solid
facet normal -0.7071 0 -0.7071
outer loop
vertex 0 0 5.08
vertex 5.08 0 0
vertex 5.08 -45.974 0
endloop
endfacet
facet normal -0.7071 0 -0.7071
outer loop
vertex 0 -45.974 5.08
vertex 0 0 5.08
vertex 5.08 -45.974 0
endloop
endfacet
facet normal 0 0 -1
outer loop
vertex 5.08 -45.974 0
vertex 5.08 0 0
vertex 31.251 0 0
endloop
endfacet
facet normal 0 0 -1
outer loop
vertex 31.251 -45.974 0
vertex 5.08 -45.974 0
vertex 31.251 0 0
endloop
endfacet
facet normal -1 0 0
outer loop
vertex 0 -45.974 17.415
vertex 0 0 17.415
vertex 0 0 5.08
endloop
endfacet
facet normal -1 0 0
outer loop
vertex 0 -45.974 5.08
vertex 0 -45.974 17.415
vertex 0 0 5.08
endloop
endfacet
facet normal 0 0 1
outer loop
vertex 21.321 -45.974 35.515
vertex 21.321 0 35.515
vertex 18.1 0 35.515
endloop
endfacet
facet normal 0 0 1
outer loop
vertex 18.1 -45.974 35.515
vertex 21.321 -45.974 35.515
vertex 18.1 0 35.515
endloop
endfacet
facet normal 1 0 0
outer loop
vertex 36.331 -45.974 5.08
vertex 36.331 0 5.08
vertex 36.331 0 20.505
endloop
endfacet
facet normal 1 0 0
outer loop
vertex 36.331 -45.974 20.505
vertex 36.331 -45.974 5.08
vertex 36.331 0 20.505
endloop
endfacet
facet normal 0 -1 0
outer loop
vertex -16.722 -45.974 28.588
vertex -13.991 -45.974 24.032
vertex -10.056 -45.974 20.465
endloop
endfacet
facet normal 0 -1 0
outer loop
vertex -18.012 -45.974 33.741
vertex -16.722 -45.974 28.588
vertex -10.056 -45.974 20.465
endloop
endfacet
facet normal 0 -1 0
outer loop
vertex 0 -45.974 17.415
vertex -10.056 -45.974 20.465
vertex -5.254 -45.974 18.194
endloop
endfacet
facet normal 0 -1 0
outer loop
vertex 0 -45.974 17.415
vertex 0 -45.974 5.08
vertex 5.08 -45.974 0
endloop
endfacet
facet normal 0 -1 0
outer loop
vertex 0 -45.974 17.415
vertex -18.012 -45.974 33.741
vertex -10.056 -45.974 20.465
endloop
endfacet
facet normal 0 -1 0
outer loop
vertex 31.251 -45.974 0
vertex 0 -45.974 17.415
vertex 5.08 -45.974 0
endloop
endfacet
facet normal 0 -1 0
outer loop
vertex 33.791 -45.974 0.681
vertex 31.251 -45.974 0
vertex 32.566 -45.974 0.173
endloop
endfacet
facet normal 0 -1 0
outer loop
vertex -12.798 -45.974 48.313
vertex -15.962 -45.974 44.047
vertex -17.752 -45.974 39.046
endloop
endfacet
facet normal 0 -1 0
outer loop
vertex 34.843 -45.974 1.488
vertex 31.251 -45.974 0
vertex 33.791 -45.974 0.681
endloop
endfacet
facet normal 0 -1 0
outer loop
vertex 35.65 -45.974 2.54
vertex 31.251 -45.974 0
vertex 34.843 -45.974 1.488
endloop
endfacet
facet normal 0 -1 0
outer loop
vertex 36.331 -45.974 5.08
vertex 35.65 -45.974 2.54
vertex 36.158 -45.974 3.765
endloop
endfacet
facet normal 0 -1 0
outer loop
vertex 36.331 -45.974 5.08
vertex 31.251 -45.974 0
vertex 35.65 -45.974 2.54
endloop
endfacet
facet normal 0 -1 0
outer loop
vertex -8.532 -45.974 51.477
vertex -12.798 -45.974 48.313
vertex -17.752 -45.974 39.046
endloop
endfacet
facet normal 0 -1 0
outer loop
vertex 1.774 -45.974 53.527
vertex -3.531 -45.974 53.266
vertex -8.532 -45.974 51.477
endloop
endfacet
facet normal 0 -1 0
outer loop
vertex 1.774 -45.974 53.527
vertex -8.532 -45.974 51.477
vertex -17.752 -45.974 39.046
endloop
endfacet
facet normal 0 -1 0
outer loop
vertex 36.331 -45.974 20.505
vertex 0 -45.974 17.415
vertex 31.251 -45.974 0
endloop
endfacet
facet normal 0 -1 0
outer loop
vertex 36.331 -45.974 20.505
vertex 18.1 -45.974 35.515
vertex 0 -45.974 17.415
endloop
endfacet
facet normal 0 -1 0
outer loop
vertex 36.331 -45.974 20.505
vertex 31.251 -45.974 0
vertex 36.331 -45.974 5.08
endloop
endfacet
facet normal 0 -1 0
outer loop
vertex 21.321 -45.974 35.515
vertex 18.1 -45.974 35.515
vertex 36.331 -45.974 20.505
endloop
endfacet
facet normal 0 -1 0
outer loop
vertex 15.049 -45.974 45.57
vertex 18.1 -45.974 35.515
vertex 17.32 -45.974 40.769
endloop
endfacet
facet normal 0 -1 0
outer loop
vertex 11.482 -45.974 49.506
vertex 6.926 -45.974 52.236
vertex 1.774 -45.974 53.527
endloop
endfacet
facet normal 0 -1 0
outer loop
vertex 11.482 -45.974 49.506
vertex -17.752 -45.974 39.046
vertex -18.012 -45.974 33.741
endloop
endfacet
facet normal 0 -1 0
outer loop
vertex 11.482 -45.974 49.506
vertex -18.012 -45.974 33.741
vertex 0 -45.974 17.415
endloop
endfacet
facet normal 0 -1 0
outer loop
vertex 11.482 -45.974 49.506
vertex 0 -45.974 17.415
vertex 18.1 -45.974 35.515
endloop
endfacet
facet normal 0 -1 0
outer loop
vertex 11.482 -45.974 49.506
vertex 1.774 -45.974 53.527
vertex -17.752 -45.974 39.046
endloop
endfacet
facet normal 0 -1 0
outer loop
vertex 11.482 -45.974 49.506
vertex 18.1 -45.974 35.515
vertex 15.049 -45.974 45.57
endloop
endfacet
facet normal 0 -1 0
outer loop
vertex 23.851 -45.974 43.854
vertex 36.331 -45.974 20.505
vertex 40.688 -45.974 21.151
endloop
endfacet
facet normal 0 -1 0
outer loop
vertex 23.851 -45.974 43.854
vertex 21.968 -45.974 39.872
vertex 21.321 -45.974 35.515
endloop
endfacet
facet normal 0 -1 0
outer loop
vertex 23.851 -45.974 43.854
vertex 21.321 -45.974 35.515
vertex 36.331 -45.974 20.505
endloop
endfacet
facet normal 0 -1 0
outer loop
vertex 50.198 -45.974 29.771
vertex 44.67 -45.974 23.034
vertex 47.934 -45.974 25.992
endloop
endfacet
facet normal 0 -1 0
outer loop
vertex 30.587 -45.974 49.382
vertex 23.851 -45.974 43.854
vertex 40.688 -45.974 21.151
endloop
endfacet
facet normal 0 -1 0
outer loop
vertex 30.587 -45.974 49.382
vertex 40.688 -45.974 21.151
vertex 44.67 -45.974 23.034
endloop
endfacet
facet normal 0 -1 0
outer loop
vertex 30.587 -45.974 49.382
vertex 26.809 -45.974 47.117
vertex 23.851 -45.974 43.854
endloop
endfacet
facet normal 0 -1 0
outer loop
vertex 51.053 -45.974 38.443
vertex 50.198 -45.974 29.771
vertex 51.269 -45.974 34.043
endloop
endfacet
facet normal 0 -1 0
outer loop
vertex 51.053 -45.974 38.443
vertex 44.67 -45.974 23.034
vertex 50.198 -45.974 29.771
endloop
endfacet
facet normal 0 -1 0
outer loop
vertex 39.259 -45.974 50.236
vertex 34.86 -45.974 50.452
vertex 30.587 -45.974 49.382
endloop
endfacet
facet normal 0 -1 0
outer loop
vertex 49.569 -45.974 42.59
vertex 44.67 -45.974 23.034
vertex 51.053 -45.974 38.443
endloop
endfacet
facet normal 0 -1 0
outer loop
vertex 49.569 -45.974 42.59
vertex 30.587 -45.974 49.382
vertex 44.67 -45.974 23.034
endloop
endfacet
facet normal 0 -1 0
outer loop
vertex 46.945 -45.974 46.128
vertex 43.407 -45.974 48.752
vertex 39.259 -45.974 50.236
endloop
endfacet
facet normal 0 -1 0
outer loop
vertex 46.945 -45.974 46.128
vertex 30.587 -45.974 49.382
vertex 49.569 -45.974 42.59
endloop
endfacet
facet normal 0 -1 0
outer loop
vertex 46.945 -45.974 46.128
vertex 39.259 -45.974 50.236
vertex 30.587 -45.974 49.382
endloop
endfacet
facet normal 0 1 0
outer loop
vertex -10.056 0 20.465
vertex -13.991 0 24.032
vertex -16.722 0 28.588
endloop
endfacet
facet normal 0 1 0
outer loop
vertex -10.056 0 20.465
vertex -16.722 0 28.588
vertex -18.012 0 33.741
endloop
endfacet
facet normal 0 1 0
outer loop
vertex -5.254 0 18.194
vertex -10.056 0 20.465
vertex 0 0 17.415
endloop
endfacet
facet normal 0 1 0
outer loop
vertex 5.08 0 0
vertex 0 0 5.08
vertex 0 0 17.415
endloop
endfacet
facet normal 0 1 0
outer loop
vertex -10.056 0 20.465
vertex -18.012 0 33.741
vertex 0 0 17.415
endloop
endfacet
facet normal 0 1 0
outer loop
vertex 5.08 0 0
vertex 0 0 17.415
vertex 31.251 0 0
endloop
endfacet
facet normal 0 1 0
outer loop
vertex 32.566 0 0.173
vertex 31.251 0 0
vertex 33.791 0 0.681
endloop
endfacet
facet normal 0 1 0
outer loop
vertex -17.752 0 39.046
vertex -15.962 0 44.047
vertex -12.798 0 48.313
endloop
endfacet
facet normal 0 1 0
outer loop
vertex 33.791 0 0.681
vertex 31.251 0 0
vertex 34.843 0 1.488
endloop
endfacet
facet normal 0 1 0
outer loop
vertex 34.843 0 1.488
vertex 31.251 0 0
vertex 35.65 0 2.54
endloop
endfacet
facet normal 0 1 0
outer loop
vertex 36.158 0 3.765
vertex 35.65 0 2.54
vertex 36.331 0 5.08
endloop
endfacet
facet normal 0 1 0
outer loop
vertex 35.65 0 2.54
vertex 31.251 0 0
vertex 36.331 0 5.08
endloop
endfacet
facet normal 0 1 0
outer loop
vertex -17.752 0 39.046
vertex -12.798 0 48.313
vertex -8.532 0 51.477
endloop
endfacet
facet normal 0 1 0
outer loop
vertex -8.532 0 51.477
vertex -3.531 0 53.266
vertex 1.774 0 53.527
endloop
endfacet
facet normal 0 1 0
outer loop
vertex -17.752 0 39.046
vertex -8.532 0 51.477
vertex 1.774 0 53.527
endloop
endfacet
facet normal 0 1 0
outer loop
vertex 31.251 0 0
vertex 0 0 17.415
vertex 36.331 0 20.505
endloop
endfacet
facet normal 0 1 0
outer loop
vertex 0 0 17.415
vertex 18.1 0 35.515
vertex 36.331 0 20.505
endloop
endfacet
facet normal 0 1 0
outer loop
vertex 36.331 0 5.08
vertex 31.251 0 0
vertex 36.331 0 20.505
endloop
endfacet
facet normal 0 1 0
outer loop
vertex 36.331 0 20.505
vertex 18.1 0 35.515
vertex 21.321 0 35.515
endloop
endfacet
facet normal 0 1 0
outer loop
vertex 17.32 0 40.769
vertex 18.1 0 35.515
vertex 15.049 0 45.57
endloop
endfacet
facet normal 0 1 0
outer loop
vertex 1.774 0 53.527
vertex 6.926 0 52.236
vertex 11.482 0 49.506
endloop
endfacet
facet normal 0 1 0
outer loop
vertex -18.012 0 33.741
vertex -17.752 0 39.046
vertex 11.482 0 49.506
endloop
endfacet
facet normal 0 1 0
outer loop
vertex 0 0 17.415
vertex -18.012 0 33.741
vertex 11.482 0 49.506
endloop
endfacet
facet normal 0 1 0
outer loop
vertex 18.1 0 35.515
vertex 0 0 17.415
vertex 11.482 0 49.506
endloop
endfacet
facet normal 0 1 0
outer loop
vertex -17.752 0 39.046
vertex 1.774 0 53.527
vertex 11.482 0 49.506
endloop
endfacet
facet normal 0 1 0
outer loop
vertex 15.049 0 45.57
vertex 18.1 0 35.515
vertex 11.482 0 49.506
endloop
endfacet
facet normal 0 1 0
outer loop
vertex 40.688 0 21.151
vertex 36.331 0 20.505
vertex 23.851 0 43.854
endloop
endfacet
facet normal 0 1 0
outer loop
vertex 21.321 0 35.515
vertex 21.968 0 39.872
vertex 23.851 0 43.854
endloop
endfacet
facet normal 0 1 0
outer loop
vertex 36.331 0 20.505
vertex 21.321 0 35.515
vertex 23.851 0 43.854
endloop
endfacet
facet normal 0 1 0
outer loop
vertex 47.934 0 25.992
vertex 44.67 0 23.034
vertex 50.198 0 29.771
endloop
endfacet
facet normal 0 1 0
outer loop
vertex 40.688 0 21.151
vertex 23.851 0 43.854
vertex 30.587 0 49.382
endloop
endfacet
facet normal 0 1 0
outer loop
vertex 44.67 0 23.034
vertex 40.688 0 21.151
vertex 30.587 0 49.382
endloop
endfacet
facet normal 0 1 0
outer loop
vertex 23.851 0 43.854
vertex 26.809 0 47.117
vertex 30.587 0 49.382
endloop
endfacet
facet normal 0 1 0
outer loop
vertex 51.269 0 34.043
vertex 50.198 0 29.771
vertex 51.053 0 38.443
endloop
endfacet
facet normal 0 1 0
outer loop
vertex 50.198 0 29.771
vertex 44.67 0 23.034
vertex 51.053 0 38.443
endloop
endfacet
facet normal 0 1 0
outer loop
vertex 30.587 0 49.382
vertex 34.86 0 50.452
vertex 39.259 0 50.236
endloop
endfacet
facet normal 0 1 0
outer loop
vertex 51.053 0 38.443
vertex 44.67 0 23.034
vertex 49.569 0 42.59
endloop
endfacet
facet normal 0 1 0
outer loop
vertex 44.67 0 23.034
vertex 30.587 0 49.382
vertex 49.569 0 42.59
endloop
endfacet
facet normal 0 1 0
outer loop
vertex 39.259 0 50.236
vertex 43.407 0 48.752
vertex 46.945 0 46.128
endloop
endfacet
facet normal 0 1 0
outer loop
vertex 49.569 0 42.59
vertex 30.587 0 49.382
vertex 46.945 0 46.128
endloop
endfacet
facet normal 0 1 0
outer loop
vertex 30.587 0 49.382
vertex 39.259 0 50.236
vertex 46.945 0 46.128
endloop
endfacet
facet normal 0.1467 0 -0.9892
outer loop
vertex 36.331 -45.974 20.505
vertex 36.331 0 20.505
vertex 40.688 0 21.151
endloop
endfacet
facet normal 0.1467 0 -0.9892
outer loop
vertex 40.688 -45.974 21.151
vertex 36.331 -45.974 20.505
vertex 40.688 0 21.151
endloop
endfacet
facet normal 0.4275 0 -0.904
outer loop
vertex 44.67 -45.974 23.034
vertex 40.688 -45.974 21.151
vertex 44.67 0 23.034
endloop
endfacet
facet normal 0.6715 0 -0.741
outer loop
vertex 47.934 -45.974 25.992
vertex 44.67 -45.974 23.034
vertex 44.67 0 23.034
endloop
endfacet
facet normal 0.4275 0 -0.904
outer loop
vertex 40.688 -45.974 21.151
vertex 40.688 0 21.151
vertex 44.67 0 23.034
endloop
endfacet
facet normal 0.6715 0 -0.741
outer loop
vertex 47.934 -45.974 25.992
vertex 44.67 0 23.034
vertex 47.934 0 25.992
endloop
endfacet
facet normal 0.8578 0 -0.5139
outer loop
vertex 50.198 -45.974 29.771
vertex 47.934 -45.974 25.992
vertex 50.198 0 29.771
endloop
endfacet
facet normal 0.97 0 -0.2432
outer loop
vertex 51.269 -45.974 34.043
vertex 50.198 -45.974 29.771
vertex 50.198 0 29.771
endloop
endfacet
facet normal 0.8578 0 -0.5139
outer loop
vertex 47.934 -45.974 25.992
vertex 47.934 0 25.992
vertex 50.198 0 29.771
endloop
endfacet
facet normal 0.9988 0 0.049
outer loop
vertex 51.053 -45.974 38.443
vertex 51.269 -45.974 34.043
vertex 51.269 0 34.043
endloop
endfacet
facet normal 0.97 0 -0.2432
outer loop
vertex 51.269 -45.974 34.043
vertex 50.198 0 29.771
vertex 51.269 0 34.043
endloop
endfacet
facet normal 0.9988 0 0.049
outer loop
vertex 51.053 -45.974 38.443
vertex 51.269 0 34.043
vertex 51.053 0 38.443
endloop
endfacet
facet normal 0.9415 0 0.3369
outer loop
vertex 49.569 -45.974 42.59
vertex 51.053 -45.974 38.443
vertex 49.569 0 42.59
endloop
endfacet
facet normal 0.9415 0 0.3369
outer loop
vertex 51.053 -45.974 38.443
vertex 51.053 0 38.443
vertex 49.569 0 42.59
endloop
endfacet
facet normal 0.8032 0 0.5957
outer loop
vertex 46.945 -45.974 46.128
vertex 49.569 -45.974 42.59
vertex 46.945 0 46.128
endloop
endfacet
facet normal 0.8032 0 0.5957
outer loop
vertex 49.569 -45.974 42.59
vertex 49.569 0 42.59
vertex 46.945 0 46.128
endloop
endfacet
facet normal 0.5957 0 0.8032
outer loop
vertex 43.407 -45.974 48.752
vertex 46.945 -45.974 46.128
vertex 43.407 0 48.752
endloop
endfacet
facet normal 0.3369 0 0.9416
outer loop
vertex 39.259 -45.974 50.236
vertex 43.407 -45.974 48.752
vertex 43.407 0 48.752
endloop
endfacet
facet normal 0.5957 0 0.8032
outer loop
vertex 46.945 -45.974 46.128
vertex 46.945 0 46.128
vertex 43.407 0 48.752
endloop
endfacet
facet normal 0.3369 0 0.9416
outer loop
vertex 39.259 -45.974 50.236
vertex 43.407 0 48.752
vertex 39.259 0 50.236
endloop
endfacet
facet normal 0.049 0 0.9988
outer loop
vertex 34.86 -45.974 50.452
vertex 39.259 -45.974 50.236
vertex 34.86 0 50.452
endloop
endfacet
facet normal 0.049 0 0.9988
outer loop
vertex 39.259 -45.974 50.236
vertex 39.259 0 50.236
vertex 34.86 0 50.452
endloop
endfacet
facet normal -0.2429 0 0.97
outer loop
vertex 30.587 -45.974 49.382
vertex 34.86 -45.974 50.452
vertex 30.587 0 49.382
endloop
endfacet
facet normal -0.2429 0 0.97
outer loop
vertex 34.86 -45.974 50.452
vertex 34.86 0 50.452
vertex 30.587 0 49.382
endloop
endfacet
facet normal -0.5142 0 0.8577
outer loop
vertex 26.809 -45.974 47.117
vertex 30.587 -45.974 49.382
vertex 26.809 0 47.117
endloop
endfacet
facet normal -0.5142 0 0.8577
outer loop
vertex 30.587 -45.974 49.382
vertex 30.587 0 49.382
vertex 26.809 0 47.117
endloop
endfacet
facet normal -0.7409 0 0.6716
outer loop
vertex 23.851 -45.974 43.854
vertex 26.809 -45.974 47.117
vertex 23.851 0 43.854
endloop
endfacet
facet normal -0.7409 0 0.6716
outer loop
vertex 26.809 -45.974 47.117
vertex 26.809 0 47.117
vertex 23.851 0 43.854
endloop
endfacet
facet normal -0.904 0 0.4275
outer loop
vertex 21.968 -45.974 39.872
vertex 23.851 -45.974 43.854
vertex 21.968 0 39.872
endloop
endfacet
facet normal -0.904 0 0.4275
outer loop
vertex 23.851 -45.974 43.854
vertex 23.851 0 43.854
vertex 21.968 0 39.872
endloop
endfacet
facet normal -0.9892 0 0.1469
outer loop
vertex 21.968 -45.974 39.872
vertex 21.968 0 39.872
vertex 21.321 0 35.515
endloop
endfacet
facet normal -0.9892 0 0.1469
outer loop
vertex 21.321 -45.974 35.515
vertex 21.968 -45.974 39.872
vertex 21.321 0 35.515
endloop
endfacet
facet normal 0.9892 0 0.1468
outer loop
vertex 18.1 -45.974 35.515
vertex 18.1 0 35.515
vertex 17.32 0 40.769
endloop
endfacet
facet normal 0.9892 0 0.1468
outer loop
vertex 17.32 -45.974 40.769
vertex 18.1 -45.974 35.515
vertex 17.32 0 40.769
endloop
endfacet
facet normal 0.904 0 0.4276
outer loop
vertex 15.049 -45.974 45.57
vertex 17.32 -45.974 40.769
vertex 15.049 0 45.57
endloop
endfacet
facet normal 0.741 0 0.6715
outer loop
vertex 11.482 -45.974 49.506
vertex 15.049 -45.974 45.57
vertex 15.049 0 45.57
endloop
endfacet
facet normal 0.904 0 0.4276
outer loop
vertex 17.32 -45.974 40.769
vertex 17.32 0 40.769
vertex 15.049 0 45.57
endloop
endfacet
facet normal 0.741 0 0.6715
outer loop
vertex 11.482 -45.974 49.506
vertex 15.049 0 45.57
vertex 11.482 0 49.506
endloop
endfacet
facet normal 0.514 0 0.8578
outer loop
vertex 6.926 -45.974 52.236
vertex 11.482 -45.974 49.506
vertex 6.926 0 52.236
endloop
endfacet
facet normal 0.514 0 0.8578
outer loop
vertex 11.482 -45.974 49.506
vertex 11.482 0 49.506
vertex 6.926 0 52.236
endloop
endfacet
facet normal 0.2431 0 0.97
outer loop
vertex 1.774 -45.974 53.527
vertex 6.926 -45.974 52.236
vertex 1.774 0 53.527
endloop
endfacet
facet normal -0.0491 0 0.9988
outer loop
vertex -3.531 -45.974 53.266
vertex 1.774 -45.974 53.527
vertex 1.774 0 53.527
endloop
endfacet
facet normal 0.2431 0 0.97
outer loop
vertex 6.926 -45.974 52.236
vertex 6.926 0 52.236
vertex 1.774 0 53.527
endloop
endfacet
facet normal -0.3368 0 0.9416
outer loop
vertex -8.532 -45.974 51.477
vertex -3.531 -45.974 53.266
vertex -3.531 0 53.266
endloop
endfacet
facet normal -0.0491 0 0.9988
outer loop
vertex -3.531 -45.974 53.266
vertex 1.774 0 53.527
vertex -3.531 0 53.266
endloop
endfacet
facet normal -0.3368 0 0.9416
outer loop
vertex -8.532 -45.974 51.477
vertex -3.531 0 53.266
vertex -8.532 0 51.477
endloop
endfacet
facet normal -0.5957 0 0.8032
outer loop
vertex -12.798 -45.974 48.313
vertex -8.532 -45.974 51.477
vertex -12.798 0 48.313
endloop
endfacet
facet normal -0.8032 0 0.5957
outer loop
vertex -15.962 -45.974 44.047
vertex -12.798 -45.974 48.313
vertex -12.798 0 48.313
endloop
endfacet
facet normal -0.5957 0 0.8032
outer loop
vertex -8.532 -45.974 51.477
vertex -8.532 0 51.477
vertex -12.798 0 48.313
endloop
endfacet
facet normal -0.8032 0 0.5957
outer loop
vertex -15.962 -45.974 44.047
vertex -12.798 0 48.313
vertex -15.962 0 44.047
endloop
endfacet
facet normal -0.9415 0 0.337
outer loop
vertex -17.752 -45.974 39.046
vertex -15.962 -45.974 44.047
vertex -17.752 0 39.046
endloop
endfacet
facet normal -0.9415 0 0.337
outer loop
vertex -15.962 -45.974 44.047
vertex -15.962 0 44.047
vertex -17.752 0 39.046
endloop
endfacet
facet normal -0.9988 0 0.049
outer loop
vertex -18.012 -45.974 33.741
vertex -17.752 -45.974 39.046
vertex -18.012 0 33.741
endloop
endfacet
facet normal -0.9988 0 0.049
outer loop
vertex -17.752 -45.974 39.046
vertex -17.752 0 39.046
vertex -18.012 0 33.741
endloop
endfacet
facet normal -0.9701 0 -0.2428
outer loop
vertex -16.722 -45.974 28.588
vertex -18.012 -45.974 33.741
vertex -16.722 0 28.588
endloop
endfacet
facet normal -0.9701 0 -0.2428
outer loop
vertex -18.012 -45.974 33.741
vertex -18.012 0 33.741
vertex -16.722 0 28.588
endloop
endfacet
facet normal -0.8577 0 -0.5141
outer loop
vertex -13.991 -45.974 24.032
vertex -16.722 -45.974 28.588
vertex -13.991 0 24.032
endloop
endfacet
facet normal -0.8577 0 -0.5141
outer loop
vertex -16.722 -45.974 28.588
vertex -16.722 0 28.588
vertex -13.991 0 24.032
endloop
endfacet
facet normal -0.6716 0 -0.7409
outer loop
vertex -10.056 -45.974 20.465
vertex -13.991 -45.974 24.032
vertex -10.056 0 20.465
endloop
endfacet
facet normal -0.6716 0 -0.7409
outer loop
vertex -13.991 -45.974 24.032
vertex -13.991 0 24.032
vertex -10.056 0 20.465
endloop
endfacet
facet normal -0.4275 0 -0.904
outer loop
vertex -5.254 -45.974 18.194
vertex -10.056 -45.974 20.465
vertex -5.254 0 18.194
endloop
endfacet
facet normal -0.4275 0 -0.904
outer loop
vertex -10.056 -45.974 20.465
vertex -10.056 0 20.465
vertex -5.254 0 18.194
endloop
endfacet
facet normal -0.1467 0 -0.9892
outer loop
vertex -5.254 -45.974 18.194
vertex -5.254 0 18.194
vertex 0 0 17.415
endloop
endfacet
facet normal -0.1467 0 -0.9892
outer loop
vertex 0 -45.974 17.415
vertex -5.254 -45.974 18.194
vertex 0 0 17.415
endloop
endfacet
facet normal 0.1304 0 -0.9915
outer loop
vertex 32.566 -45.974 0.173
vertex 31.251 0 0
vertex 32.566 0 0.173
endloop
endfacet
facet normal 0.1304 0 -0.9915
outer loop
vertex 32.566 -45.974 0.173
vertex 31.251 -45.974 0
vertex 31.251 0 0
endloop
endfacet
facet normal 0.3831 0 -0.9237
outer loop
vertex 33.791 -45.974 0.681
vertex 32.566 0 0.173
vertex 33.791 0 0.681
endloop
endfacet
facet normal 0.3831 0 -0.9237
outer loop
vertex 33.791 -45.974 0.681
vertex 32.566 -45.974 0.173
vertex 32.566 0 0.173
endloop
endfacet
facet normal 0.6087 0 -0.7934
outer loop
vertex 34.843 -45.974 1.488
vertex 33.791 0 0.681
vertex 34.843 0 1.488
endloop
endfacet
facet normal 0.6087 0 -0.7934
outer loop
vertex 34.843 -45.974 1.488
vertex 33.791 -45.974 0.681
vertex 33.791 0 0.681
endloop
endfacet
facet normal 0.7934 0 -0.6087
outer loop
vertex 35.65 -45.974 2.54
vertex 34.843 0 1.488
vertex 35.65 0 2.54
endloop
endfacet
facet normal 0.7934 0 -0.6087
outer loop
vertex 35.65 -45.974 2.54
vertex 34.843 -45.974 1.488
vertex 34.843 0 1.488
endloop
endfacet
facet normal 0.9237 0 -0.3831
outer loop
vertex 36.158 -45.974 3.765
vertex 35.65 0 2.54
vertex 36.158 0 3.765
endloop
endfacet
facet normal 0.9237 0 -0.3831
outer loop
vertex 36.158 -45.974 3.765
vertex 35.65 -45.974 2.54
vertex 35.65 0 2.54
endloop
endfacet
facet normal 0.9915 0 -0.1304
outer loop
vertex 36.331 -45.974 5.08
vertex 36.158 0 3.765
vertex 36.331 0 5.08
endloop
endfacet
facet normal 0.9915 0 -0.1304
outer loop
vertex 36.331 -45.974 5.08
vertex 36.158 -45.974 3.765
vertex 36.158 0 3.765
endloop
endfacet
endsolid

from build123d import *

# Parameters (mm, degrees)
F1_DEPTH = 45.974
F2_SIZE  = 5.08
F3_R     = 5.08


with BuildPart() as f1:
    # F0 (on Front) → F1 (new body)
    with BuildSketch(Plane.XZ):
        with BuildLine():
            Line((0, 17.415097), (0, 0))
            Line((0, 0), (36.331072, 0))
            Line((36.331072, 0), (36.331072, 20.504786))
            ThreePointArc((36.331072, 20.504786), (46.944643, 46.128212), (21.321217, 35.514642))
            Line((21.321217, 35.514642), (18.099545, 35.514642))
            ThreePointArc((18.099545, 35.514642), (-12.798311, 48.312952), (0, 17.415097))
        make_face()
    extrude(amount=F1_DEPTH)

    # F2
    f2_edges = [f1.edges().sort_by_distance(p)[0] for p in [
        (0, -22.987, 0),
    ]]
    chamfer(f2_edges, length=F2_SIZE)

    # F3
    f3_edges = [f1.edges().sort_by_distance(p)[0] for p in [
        (36.331072, -22.987, 0),
    ]]
    fillet(f3_edges, radius=F3_R)


solid = f1.part
